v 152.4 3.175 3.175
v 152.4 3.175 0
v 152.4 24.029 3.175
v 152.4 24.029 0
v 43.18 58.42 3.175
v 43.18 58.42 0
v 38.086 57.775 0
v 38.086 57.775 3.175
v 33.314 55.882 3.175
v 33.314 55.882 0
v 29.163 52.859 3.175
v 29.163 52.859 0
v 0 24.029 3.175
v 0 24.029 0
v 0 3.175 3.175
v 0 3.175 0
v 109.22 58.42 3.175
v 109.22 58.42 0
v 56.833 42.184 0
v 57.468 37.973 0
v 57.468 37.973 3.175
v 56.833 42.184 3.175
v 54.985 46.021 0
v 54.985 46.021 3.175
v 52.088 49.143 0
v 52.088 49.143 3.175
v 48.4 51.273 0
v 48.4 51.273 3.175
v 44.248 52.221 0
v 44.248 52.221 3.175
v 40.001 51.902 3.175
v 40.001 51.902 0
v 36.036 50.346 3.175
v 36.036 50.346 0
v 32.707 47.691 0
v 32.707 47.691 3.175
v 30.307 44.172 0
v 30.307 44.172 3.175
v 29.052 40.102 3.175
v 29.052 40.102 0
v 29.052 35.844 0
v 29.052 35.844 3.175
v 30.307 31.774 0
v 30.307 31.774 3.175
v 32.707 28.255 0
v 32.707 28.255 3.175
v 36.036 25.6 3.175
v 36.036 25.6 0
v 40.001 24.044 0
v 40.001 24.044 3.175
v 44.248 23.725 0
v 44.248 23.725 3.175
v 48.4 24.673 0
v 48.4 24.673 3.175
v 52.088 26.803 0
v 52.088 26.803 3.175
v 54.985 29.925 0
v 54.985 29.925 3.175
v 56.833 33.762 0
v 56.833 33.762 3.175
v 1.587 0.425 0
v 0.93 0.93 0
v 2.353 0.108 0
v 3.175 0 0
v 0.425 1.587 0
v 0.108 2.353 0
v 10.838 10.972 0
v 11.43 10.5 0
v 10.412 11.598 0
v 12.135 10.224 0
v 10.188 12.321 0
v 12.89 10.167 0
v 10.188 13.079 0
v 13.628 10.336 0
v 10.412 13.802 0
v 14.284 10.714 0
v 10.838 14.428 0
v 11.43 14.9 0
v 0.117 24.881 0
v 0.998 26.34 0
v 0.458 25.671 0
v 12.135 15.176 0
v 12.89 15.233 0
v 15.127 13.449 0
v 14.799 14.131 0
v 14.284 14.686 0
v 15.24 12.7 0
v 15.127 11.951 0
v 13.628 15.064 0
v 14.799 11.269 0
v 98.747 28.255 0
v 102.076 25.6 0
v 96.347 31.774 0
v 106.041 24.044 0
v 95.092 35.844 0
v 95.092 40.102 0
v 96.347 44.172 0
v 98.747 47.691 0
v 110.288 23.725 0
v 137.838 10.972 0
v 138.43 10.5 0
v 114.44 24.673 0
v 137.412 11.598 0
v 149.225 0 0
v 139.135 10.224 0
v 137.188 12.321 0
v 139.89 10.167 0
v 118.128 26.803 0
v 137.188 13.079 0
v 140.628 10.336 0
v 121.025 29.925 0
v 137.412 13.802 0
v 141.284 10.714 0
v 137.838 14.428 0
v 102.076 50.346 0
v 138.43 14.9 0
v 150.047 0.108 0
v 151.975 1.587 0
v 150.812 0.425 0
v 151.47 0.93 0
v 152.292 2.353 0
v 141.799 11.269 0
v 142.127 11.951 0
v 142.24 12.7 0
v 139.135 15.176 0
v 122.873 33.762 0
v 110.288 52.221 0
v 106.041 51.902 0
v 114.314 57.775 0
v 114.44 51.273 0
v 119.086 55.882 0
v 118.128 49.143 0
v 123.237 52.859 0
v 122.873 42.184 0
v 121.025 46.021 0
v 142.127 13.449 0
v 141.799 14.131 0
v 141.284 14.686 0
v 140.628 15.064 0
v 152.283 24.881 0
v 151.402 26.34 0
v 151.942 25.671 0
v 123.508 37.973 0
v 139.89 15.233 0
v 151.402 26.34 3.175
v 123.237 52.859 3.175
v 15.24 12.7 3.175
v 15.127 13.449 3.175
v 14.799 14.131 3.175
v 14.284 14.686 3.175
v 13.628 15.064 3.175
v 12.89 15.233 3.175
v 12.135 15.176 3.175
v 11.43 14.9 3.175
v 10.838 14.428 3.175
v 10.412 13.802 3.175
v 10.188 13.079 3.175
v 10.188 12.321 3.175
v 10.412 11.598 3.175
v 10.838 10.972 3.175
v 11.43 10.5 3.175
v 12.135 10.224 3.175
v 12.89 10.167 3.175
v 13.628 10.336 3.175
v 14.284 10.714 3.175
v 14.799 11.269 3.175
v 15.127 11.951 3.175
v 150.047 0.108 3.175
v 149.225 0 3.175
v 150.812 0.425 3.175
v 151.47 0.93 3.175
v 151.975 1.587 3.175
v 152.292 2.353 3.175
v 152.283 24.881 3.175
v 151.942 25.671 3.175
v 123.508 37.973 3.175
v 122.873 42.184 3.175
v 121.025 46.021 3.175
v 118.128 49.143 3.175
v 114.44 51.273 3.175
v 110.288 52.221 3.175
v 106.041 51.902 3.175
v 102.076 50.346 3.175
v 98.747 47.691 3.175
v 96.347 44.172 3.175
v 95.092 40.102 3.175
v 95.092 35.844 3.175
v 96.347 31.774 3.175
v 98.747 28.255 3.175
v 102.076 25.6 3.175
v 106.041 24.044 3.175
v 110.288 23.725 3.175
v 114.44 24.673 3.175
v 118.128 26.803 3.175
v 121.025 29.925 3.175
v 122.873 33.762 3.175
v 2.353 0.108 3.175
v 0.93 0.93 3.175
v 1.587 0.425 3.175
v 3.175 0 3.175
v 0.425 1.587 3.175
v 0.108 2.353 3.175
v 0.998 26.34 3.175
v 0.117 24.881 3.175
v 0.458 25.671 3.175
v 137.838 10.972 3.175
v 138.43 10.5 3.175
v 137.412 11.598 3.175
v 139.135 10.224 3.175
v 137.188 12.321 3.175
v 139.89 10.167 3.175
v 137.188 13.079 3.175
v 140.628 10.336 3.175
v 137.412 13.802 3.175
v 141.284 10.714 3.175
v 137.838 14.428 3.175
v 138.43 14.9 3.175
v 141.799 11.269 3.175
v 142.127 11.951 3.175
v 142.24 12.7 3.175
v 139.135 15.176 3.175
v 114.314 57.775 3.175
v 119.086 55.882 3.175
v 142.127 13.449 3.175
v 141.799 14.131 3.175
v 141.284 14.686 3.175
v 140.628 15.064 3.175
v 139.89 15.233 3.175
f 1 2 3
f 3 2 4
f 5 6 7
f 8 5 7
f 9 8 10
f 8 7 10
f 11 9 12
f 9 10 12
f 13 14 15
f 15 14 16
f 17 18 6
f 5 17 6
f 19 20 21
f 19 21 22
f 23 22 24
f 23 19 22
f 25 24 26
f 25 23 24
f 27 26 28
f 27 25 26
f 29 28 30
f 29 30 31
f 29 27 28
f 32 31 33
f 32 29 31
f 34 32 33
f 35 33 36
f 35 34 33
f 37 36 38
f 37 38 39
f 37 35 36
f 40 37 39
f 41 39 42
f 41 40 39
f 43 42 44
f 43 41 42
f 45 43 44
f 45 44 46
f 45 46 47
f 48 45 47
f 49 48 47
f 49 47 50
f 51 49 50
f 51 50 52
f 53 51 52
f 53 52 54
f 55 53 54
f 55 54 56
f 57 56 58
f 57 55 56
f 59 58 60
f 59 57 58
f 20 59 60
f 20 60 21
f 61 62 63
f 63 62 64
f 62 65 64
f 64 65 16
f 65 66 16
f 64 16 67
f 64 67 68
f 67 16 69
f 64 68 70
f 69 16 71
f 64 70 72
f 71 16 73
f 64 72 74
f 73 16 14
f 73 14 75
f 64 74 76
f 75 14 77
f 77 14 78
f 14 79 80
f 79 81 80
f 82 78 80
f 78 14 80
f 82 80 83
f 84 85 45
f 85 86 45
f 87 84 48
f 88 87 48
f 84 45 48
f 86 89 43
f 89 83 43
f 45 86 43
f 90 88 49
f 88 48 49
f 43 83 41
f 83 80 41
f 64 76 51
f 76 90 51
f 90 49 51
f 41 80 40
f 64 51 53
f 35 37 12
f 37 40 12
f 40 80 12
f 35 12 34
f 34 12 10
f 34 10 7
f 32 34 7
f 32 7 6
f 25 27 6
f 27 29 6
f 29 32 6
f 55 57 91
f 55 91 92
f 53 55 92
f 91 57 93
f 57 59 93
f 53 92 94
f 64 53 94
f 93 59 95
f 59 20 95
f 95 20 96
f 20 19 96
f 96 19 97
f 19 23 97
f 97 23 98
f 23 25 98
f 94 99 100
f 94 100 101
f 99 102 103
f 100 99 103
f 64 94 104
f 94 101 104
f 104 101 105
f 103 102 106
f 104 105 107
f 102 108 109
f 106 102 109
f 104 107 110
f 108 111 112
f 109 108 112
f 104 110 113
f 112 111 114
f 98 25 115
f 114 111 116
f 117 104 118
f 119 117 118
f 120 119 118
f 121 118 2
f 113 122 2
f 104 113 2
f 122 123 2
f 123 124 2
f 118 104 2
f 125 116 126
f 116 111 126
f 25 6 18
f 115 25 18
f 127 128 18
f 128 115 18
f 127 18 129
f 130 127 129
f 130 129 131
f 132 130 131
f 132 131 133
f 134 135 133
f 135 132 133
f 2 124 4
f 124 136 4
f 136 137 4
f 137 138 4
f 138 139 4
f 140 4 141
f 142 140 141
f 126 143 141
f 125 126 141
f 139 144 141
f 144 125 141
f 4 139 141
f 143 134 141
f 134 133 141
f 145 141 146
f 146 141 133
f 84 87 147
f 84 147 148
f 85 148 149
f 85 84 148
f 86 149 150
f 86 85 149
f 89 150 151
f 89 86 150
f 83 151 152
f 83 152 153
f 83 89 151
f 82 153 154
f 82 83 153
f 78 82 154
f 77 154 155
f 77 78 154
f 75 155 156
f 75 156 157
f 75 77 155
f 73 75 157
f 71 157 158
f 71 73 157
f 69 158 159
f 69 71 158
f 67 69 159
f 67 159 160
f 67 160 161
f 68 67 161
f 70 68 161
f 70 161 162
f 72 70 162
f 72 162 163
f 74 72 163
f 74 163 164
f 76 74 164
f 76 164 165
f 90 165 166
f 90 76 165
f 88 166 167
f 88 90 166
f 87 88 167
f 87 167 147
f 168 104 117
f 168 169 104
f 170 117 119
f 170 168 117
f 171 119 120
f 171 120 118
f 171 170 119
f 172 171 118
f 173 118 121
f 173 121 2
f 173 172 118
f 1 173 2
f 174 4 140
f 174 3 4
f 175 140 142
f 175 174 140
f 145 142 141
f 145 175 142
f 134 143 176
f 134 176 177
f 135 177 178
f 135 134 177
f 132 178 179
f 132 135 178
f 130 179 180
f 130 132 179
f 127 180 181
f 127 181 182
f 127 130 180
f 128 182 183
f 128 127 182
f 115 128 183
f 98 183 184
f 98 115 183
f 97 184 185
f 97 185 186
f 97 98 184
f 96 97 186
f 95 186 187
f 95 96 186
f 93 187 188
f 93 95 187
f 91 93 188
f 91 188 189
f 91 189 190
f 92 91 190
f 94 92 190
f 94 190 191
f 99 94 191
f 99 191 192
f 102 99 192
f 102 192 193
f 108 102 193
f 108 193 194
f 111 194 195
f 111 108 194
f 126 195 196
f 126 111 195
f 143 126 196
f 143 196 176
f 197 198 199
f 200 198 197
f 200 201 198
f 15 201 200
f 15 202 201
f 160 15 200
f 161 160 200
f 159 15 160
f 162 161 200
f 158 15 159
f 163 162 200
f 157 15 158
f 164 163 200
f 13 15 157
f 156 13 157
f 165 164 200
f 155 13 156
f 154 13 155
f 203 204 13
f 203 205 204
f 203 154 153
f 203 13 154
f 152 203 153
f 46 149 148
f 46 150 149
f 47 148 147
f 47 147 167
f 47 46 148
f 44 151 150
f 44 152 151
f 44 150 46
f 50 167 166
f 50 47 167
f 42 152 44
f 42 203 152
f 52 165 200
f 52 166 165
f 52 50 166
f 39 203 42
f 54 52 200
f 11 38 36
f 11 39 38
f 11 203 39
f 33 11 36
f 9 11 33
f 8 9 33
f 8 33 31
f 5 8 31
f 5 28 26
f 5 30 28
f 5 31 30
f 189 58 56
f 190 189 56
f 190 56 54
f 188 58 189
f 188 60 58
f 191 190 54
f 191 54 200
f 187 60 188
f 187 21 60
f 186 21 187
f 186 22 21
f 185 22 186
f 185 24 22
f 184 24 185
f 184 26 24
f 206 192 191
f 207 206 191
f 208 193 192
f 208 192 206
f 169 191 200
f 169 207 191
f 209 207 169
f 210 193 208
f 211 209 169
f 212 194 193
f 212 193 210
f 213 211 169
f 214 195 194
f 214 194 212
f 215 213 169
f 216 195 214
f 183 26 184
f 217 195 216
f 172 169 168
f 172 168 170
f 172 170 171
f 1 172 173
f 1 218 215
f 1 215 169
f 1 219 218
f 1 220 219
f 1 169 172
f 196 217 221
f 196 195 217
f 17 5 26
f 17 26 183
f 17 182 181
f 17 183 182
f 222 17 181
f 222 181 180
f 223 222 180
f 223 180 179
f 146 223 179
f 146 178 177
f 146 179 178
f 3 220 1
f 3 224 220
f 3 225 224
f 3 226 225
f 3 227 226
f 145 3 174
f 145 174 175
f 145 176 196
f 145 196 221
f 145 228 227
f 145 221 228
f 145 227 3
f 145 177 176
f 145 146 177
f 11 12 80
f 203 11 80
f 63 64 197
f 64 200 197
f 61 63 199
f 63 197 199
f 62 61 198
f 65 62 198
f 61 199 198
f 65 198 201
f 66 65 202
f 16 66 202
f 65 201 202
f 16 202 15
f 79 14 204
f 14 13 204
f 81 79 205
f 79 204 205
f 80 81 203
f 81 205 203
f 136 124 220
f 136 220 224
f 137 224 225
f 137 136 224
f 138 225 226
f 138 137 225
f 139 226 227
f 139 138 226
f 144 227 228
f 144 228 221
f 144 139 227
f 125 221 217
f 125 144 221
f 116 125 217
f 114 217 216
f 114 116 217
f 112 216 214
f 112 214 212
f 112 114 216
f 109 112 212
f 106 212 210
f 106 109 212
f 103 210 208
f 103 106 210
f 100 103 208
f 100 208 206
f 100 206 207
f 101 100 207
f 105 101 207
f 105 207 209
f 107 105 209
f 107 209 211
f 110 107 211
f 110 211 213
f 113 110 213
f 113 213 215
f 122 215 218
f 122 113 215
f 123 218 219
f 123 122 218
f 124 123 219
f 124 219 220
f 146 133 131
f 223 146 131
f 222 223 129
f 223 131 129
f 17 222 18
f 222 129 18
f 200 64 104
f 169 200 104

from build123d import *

# Parameters (mm, degrees)
SKETCH1_R           = 14.2875
SKETCH1_R_2         = 2.54
BOSS_EXTRUDE1_DEPTH = 3.175
FILLET1_R           = 3.175


with BuildPart() as part:
    # Sketch1 → Boss-Extrude1 (new body)
    with BuildSketch(Plane.XY):
        with BuildLine():
            Line((0, 0), (152.4, 0))
            Line((152.4, 0), (152.4, 25.4))
            Line((152.4, 25.4), (123.236852256, 52.859492597))
            ThreePointArc((123.236852256, 52.859492597), (116.759751152, 56.979103271), (109.22, 58.42))
            Line((109.22, 58.42), (43.18, 58.42))
            ThreePointArc((43.18, 58.42), (35.640248848, 56.979103271), (29.163147744, 52.859492597))
            Line((29.163147744, 52.859492597), (0, 25.4))
            Line((0, 25.4), (0, 0))
        make_face()
        with Locations((43.18, 37.973)):
            Circle(SKETCH1_R, mode=Mode.SUBTRACT)
        with Locations((109.22, 37.973)):
            Circle(SKETCH1_R, mode=Mode.SUBTRACT)
        with Locations((12.7, 12.7)):
            Circle(SKETCH1_R_2, mode=Mode.SUBTRACT)
        with Locations((139.7, 12.7)):
            Circle(SKETCH1_R_2, mode=Mode.SUBTRACT)
    extrude(amount=BOSS_EXTRUDE1_DEPTH)

    # Fillet1
    fillet1_edges = [part.edges().sort_by_distance(p)[0] for p in [
        (0, 25.4, 1.5875),
        (152.4, 25.4, 1.5875),
        (152.4, 0, 1.5875),
        (0, 0, 1.5875),
    ]]
    fillet(fillet1_edges, radius=FILLET1_R)


solid = part.part
